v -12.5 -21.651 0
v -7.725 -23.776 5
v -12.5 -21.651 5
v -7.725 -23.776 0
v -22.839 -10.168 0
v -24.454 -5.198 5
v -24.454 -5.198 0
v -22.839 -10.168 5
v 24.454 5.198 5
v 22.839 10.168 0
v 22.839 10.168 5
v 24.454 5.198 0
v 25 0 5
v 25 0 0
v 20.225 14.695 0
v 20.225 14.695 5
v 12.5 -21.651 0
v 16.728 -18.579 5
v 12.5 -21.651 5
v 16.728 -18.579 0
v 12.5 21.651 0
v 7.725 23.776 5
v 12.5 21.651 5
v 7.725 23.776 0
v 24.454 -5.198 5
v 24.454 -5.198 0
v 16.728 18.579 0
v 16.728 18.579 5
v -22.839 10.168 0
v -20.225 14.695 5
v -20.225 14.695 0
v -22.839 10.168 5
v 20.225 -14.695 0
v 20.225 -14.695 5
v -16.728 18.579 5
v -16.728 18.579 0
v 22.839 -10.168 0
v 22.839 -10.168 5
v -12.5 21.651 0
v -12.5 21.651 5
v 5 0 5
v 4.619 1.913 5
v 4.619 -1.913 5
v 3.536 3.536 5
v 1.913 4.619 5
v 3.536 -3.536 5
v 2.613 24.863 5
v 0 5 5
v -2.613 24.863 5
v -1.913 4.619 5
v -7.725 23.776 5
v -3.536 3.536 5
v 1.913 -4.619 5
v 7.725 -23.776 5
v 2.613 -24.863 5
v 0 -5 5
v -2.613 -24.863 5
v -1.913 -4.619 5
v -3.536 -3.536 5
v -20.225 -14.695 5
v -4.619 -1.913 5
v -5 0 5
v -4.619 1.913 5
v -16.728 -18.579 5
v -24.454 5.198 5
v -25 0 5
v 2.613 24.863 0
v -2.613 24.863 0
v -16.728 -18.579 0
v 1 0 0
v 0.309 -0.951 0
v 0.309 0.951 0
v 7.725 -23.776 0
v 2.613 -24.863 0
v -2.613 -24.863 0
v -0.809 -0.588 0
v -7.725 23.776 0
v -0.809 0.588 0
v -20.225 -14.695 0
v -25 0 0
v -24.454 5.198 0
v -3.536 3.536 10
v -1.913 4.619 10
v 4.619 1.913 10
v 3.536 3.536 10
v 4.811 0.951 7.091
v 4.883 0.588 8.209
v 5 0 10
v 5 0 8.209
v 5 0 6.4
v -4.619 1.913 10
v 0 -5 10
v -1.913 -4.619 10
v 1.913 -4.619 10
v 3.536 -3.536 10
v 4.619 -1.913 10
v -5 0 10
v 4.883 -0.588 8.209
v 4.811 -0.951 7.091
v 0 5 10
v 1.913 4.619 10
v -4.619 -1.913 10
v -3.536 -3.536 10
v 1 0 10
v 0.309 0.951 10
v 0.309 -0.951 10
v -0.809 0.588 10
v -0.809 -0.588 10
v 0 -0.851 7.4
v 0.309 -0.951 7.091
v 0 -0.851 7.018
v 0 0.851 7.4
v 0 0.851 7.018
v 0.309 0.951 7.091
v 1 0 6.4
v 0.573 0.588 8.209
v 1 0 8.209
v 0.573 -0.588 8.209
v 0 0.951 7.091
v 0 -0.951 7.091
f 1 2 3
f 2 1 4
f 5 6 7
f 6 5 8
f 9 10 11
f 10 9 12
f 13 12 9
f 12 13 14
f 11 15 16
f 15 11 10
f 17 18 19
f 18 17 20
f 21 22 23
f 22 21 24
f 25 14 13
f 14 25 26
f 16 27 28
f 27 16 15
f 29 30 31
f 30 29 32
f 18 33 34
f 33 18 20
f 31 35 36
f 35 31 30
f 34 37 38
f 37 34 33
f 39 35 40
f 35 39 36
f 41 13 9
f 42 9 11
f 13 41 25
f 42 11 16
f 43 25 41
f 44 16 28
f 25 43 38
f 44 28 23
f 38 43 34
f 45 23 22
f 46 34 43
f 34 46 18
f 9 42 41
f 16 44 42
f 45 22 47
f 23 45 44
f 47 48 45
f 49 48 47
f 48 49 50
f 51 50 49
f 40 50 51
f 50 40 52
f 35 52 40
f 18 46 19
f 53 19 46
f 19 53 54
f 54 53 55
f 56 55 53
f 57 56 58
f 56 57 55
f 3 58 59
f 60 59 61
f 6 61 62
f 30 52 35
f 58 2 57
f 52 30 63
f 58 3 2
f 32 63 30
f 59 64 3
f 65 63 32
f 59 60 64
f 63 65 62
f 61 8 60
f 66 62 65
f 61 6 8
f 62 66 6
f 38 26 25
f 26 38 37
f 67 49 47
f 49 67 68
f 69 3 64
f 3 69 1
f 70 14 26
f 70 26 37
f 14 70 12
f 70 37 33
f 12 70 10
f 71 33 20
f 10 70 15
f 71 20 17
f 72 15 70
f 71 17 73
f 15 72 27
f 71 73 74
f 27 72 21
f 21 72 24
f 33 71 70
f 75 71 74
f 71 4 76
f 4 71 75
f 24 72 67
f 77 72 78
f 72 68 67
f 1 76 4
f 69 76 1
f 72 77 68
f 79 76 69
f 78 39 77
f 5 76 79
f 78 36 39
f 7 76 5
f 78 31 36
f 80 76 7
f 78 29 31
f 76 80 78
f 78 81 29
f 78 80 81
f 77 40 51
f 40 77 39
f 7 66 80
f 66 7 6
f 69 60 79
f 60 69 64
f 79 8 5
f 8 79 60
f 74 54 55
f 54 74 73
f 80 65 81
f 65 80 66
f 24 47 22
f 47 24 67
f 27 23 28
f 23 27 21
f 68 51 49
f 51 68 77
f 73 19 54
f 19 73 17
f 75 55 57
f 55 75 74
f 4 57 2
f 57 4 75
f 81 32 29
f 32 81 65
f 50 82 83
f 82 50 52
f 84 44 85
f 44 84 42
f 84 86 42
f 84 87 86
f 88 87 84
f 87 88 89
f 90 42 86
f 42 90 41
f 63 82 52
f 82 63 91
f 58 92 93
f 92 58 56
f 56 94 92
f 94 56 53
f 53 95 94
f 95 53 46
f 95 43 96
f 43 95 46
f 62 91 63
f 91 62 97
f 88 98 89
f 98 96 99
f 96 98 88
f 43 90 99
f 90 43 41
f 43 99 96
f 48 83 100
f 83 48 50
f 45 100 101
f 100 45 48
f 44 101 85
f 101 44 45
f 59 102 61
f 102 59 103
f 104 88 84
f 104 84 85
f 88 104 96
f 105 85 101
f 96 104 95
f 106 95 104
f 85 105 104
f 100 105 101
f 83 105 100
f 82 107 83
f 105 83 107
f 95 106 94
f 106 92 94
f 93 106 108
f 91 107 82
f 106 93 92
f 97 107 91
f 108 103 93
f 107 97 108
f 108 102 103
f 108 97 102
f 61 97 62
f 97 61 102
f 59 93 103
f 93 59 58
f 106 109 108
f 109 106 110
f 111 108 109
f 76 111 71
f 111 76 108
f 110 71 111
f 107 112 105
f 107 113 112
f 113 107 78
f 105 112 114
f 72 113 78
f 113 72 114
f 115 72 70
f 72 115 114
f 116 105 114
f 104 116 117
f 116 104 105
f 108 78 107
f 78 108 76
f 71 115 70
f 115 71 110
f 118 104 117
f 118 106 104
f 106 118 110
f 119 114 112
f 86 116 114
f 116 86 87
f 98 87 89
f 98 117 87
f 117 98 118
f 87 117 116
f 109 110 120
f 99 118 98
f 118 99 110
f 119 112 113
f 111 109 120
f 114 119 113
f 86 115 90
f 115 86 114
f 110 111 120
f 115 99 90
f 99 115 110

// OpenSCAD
//$fa=0.5;
//$fs=0.5;


module base() {
  union() {
    difference() {
      cube([60, 60, 90]);
      translate([61, 30, 30])
      rotate([0, -90, 0])
        rpivot(5.5, 25.5, 5.5);
    }
  }
}

module pivot(height, br, sr) {
  union() {
    difference() {
      rpivot(height, br, sr);
      cylinder(h=11, r=1);
      translate([0, 0, 7.4])
        rotate([0, 90, 0])
          cylinder(h=sr+1, r=1);
    }
  }
} 

module rpivot(height, br, sr) {    
  union() {
    cylinder(h=height, r=25);
      translate([0, 0, 5])
        cylinder(h=height, r=5);
  }
}

module bar() {
  cube([70, 25, 5]);
  translate([75/2, 0, 5])
    translate()
    rotate([0, -90, 0])
    difference() {
      union() {
        cube([25, 25, 5]);
        translate([12.5, 0, 0])
          difference() {
            cylinder(r=3, h=5);
            cylinder(r=1, h=6);
          }
        translate([12.5, 25, 0])
          difference() {
            cylinder(r=3, h=5);
            cylinder(r=1, h=6);
          }
      }
      translate([12.5, 12.5, -0.5])
        cylinder(r=10, h=6);
    }
}

module holder() {
      union() {
        cube([25, 30, 5]);
        translate([12.5, 0, 0])
          difference() {
            cylinder(r=3, h=5);
            cylinder(r=1, h=6);
          }
        translate([12.5, 30, 0])
          difference() {
            cylinder(r=3, h=5);
            cylinder(r=1, h=6);
          }
      }
      translate([12.5, 15, 0])
        cylinder(r=12, h=5.5);
      translate([12.5, 15, 0])
        cylinder(r=9, h=5.7);
      translate([12.5, 15, 0])
        cylinder(r=6, h=5.9);
    
}

//holder();
//bar();
pivot(5, 25, 5);
